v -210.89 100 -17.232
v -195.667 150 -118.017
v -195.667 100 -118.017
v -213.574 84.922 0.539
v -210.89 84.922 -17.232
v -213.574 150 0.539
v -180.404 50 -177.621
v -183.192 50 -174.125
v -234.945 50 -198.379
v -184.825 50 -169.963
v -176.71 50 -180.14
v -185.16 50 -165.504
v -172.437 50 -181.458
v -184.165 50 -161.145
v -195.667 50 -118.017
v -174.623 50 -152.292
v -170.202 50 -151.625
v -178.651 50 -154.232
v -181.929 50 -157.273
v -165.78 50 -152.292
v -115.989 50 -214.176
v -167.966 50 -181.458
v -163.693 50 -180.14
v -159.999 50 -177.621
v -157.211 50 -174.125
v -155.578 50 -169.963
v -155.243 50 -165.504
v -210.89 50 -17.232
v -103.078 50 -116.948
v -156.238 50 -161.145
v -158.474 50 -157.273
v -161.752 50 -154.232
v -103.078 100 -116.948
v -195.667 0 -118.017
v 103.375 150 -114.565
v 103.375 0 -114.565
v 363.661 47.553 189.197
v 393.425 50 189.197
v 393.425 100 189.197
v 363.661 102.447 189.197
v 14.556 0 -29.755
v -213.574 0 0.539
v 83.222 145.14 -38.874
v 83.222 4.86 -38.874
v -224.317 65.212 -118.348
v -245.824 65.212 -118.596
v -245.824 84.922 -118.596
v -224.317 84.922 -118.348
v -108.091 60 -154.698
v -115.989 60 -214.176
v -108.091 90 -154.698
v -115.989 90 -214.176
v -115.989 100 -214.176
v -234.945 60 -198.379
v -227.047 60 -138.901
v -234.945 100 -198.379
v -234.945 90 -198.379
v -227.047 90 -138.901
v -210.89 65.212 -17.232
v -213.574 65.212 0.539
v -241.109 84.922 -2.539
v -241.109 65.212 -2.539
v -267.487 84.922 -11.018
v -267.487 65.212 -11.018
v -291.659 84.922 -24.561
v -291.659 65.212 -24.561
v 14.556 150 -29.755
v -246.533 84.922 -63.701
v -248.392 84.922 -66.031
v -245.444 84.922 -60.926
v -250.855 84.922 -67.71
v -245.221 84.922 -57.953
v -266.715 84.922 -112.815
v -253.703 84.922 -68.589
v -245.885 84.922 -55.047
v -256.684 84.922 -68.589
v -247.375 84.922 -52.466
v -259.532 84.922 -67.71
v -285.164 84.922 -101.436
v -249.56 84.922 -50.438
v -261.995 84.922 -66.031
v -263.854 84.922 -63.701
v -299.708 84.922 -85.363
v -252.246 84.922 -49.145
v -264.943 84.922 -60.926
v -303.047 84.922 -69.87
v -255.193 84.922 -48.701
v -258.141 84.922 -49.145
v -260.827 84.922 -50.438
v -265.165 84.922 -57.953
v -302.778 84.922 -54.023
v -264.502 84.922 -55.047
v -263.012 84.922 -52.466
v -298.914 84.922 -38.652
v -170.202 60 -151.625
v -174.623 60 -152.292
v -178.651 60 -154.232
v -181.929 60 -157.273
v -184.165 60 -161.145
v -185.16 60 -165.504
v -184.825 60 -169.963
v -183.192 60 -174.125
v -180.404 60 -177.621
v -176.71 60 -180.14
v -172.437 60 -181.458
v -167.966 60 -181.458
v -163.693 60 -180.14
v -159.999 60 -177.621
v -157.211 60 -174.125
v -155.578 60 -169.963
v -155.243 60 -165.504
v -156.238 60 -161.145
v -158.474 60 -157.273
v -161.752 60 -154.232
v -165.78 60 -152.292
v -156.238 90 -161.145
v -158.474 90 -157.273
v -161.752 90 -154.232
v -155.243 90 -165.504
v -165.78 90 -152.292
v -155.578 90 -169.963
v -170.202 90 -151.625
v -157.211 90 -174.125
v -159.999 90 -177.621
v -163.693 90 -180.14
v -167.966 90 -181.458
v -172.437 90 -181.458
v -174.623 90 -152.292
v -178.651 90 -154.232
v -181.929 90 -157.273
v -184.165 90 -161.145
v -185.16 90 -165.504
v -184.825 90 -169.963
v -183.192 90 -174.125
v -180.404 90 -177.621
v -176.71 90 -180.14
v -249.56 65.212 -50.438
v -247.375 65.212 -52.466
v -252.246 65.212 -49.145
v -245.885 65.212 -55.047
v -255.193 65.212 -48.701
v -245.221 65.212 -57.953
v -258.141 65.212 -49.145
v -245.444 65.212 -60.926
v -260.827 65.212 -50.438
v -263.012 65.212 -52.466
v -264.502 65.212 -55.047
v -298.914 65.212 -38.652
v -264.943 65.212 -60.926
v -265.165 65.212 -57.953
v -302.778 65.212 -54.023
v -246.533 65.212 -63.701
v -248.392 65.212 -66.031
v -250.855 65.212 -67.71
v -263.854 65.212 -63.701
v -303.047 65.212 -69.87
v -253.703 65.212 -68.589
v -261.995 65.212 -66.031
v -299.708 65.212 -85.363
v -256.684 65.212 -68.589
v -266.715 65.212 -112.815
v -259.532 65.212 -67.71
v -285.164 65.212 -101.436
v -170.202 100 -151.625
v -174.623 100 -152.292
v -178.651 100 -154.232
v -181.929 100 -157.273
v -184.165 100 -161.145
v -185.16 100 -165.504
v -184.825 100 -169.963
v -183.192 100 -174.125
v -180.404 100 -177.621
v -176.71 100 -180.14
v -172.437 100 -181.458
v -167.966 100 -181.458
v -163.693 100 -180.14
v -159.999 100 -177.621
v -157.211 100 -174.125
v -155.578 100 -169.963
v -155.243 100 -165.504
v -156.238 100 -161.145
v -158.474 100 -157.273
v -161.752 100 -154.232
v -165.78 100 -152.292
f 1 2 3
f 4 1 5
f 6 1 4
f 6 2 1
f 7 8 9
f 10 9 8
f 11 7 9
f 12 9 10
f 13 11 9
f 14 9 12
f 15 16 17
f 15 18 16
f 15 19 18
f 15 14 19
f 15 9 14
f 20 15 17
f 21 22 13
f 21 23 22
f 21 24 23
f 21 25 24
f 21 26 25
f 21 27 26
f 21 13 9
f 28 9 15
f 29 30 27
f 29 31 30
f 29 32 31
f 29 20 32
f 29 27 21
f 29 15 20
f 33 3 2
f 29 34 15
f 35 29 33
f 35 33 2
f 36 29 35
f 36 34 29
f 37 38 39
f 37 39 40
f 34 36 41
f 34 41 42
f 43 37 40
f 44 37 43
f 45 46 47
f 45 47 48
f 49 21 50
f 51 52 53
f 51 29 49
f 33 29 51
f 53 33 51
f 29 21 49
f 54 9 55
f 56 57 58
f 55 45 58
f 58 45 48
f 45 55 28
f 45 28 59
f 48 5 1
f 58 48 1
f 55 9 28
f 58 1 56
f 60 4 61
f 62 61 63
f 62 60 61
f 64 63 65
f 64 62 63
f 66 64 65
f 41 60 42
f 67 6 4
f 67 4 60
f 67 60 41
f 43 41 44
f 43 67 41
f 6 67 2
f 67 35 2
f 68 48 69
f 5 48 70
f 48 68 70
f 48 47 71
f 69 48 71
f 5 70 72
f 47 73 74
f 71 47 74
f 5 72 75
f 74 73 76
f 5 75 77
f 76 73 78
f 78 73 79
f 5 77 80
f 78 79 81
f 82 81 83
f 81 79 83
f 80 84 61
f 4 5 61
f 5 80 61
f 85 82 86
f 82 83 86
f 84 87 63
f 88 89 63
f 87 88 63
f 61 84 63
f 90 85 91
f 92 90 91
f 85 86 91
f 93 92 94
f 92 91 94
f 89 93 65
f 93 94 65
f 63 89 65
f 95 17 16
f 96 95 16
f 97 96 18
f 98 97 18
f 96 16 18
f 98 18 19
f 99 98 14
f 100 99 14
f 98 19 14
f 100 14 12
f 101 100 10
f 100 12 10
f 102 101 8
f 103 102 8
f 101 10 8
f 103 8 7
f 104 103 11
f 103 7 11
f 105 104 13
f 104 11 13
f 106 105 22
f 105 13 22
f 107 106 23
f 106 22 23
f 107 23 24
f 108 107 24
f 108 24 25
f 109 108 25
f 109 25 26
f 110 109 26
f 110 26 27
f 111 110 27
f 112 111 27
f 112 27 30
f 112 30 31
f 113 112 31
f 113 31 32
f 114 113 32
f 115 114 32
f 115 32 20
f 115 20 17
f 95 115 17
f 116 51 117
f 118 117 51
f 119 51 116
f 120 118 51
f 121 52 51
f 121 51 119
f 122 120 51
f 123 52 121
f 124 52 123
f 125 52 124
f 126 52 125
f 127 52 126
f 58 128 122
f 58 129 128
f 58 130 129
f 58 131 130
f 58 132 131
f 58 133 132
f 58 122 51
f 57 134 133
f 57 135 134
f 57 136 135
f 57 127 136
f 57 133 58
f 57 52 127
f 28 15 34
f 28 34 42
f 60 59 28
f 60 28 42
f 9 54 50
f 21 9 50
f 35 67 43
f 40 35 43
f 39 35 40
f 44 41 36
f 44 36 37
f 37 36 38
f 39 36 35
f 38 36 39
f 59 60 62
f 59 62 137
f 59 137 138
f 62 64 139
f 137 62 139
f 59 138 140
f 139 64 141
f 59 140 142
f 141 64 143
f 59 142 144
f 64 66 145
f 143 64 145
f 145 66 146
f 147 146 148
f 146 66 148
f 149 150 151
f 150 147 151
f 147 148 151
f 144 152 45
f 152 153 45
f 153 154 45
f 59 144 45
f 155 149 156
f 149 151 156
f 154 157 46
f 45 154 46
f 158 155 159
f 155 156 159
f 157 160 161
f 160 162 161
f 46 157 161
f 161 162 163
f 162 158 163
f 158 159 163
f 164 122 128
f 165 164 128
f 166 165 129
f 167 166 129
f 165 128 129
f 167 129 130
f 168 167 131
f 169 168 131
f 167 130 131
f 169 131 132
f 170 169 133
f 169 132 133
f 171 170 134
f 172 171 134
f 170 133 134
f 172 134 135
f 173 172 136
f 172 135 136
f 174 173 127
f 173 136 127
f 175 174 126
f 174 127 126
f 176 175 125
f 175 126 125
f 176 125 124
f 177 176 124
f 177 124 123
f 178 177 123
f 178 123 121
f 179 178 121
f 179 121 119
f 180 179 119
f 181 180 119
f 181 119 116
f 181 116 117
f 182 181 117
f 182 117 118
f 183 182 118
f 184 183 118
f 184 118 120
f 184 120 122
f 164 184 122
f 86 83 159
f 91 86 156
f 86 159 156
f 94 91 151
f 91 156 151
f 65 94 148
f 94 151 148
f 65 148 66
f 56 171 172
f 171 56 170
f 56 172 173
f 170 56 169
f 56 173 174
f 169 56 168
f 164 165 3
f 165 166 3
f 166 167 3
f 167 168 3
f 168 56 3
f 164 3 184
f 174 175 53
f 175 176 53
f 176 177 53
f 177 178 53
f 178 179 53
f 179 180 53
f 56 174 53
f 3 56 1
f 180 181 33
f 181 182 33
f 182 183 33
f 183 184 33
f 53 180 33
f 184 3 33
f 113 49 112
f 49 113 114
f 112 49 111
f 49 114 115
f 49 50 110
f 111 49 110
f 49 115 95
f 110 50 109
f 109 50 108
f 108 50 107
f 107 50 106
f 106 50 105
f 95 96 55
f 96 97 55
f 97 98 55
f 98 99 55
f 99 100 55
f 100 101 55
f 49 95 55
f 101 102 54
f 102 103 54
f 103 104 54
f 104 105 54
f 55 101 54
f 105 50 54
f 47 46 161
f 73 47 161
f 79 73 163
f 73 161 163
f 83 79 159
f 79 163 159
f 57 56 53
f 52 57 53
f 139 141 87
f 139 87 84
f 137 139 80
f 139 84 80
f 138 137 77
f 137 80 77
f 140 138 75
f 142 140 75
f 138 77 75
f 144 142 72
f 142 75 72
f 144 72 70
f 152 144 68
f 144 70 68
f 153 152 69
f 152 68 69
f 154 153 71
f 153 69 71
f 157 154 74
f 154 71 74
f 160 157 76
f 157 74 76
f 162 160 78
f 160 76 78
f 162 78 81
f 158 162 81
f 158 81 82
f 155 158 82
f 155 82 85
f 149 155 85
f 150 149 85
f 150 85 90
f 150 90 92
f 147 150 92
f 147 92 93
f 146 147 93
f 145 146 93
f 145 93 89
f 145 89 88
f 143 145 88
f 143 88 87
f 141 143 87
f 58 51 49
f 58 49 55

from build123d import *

# Parameters (mm, degrees)
EXTRUDE_1_DEPTH      = 150
SKETCH_3_W           = 134.939871442
SKETCH_3_H           = 65.077722632
SKETCH_3_W_2         = 12.852713976
SKETCH_3_H_2         = 65.21229221
SKETCH_3_W_3         = 22.325721816
CUT_EXTRUDE_5_DEPTH  = 100
SKETCH_4_R           = 10
CUT_EXTRUDE_6_DEPTH  = 100
CUT_EXTRUDE_7_DEPTH  = 542.338297497
SKETCH_9_W           = 120
SKETCH_9_H           = 50
EXTRUDE_5_DEPTH      = 200
SKETCH_12_W          = 124.1848091
SKETCH_12_H          = 30
CUT_EXTRUDE_14_DEPTH = 60
SKETCH_13_R          = 15
CUT_EXTRUDE_15_DEPTH = 459.970793946
CUT_EXTRUDE_16_DEPTH = 600
CUT_EXTRUDE_18_DEPTH = 600
CUT_EXTRUDE_23_DEPTH = 600


with BuildPart() as part:
    # 草图1 → 凸台-拉伸1 (new body)
    with BuildSketch(Plane(origin=(0, 0, 0), x_dir=(1, 0, 0), z_dir=(0, 1, 0))):
        Polygon((-296.625222025, 119.18294849), (103.374777975, 114.564831261), (393.424758435, -189.19660282), (363.661240814, -189.19660282), (83.221819158, 38.873627041), (-316.778180842, -14.24353747), align=None)
    extrude(amount=EXTRUDE_1_DEPTH)

    # 草图3 → 切除-拉伸5 (cut)
    with BuildSketch(Plane(origin=(-307.609145788, 0, -46.461798062), x_dir=(-0.14934769539615667, 0, 0.9887847419331757), z_dir=(-0.9887847419331757, 0, -0.14934769539615664))):
        Polygon((-73.54598766, 84.922277368), (-73.54598766, 150), (-110.299587537, 150), (-108.970561803, 84.922277368), align=None)
        with Locations((-6.076051939, 117.461138684)):
            Rectangle(SKETCH_3_W, SKETCH_3_H)
        with Locations((67.82024077, 117.461138684)):
            Rectangle(SKETCH_3_W_2, SKETCH_3_H)
        Polygon((-73.54598766, 0), (-73.54598766, 65.21229221), (-88.627784697, 65.21229221), (-110.299587537, 65.21229221), (-110.299587537, 0), align=None)
        with Locations((-6.076051939, 32.606146105)):
            Rectangle(SKETCH_3_W, SKETCH_3_H_2)
        with Locations((72.55674469, 32.606146105)):
            Rectangle(SKETCH_3_W_3, SKETCH_3_H_2)
    extrude(amount=-CUT_EXTRUDE_5_DEPTH, mode=Mode.SUBTRACT)

    # 草图4 → 切除-拉伸6 (cut)
    with BuildSketch(Plane(origin=(0, 84.922277368, 0), x_dir=(1, 0, 0), z_dir=(0, 1, 0))):
        with Locations(Location((-255.193452216, 58.700607885, 0), (0, 0, 270))):
            Circle(SKETCH_4_R)
    extrude(amount=-CUT_EXTRUDE_6_DEPTH, mode=Mode.SUBTRACT)

    # 草图5 → 切除-拉伸7 (cut, through all)
    with BuildSketch(Plane(origin=(111.294466259, 0, -106.270757713), x_dir=(-0.6905951915709648, 0, -0.7232415097179243), z_dir=(0.7232415097179243, 0, -0.6905951915709648))):
        Polygon((11.467916923, 150), (-408.532083077, 100), (-408.532083077, 150), align=None)
        Polygon((11.467916923, 0), (-408.532083077, 50), (-408.532083077, 0), align=None)
    extrude(amount=-CUT_EXTRUDE_7_DEPTH, mode=Mode.SUBTRACT)

    # 草图9 → 凸台-拉伸5 (add)
    with BuildSketch(Plane(origin=(-3.630590426, 0, -27.340242721), x_dir=(0.9912979424923631, 0, -0.13163733972702288), z_dir=(0.13163733972702288, 0, 0.9912979424923631))):
        with Locations((-146.786325955, 75)):
            Rectangle(SKETCH_9_W, SKETCH_9_H)
    extrude(amount=-EXTRUDE_5_DEPTH)

    # 草图12 → 切除-拉伸14 (cut)
    with BuildSketch(Plane(origin=(-29.958058371, 0, -225.599831219), x_dir=(-0.991297942492363, 0, 0.1316373397270229), z_dir=(-0.1316373397270229, 0, -0.991297942492363))):
        with Locations((145.743983676, 75)):
            Rectangle(SKETCH_12_W, SKETCH_12_H)
    extrude(amount=-CUT_EXTRUDE_14_DEPTH, mode=Mode.SUBTRACT)

    # 草图13 → 切除-拉伸15 (cut, through all)
    with BuildSketch(Plane(origin=(0, 50, 0), x_dir=(-1, 0, 0), z_dir=(0, -1, 0))):
        with Locations(Location((170.201547688, 166.625352062, 0), (0, 0, 270))):
            Circle(SKETCH_13_R)
    extrude(amount=-CUT_EXTRUDE_15_DEPTH, mode=Mode.SUBTRACT)

    # 草图14 → 切除-拉伸16 (cut)
    with BuildSketch(Plane.XZ.offset(-65.21229221)):
        with BuildLine():
            Line((-316.778180842, 14.24353747), (-213.573939594, 0.538745819))
            ThreePointArc((-213.573939594, 0.538745819), (-264.946374334, -9.940662831), (-308.780384447, -38.707390387))
            Line((-308.780384447, -38.707390387), (-316.778180842, 14.24353747))
        make_face()
    extrude(amount=-CUT_EXTRUDE_16_DEPTH, mode=Mode.SUBTRACT)

    # 草图15 → 切除-拉伸18 (cut)
    with BuildSketch(Plane(origin=(0, 65.21229221, 0), x_dir=(-1, 0, 0), z_dir=(0, -1, 0))):
        with BuildLine():
            ThreePointArc((245.824298176, 118.596436936), (278.450621549, 106.430151008), (302.373134739, 81.127802248))
            Line((302.373134739, 81.127802248), (296.625222025, 119.18294849))
            Line((296.625222025, 119.18294849), (245.824298176, 118.596436936))
        make_face()
    extrude(amount=-CUT_EXTRUDE_18_DEPTH, mode=Mode.SUBTRACT)

    # 草图16 → 切除-拉伸23 (cut)
    with BuildSketch(Plane(origin=(0, 65.21229221, 0), x_dir=(-1, 0, 0), z_dir=(0, -1, 0))):
        with BuildLine():
            Line((291.65867542, 24.560550225), (320.979664595, 36.581658237))
            Line((320.979664595, 36.581658237), (321.34512954, 76.765505909))
            Line((321.34512954, 76.765505909), (299.707915755, 85.363339544))
            ThreePointArc((299.707915755, 85.363339544), (302.777897257, 54.022742019), (291.65867542, 24.560550225))
        make_face()
    extrude(amount=-CUT_EXTRUDE_23_DEPTH, mode=Mode.SUBTRACT)


solid = part.part
